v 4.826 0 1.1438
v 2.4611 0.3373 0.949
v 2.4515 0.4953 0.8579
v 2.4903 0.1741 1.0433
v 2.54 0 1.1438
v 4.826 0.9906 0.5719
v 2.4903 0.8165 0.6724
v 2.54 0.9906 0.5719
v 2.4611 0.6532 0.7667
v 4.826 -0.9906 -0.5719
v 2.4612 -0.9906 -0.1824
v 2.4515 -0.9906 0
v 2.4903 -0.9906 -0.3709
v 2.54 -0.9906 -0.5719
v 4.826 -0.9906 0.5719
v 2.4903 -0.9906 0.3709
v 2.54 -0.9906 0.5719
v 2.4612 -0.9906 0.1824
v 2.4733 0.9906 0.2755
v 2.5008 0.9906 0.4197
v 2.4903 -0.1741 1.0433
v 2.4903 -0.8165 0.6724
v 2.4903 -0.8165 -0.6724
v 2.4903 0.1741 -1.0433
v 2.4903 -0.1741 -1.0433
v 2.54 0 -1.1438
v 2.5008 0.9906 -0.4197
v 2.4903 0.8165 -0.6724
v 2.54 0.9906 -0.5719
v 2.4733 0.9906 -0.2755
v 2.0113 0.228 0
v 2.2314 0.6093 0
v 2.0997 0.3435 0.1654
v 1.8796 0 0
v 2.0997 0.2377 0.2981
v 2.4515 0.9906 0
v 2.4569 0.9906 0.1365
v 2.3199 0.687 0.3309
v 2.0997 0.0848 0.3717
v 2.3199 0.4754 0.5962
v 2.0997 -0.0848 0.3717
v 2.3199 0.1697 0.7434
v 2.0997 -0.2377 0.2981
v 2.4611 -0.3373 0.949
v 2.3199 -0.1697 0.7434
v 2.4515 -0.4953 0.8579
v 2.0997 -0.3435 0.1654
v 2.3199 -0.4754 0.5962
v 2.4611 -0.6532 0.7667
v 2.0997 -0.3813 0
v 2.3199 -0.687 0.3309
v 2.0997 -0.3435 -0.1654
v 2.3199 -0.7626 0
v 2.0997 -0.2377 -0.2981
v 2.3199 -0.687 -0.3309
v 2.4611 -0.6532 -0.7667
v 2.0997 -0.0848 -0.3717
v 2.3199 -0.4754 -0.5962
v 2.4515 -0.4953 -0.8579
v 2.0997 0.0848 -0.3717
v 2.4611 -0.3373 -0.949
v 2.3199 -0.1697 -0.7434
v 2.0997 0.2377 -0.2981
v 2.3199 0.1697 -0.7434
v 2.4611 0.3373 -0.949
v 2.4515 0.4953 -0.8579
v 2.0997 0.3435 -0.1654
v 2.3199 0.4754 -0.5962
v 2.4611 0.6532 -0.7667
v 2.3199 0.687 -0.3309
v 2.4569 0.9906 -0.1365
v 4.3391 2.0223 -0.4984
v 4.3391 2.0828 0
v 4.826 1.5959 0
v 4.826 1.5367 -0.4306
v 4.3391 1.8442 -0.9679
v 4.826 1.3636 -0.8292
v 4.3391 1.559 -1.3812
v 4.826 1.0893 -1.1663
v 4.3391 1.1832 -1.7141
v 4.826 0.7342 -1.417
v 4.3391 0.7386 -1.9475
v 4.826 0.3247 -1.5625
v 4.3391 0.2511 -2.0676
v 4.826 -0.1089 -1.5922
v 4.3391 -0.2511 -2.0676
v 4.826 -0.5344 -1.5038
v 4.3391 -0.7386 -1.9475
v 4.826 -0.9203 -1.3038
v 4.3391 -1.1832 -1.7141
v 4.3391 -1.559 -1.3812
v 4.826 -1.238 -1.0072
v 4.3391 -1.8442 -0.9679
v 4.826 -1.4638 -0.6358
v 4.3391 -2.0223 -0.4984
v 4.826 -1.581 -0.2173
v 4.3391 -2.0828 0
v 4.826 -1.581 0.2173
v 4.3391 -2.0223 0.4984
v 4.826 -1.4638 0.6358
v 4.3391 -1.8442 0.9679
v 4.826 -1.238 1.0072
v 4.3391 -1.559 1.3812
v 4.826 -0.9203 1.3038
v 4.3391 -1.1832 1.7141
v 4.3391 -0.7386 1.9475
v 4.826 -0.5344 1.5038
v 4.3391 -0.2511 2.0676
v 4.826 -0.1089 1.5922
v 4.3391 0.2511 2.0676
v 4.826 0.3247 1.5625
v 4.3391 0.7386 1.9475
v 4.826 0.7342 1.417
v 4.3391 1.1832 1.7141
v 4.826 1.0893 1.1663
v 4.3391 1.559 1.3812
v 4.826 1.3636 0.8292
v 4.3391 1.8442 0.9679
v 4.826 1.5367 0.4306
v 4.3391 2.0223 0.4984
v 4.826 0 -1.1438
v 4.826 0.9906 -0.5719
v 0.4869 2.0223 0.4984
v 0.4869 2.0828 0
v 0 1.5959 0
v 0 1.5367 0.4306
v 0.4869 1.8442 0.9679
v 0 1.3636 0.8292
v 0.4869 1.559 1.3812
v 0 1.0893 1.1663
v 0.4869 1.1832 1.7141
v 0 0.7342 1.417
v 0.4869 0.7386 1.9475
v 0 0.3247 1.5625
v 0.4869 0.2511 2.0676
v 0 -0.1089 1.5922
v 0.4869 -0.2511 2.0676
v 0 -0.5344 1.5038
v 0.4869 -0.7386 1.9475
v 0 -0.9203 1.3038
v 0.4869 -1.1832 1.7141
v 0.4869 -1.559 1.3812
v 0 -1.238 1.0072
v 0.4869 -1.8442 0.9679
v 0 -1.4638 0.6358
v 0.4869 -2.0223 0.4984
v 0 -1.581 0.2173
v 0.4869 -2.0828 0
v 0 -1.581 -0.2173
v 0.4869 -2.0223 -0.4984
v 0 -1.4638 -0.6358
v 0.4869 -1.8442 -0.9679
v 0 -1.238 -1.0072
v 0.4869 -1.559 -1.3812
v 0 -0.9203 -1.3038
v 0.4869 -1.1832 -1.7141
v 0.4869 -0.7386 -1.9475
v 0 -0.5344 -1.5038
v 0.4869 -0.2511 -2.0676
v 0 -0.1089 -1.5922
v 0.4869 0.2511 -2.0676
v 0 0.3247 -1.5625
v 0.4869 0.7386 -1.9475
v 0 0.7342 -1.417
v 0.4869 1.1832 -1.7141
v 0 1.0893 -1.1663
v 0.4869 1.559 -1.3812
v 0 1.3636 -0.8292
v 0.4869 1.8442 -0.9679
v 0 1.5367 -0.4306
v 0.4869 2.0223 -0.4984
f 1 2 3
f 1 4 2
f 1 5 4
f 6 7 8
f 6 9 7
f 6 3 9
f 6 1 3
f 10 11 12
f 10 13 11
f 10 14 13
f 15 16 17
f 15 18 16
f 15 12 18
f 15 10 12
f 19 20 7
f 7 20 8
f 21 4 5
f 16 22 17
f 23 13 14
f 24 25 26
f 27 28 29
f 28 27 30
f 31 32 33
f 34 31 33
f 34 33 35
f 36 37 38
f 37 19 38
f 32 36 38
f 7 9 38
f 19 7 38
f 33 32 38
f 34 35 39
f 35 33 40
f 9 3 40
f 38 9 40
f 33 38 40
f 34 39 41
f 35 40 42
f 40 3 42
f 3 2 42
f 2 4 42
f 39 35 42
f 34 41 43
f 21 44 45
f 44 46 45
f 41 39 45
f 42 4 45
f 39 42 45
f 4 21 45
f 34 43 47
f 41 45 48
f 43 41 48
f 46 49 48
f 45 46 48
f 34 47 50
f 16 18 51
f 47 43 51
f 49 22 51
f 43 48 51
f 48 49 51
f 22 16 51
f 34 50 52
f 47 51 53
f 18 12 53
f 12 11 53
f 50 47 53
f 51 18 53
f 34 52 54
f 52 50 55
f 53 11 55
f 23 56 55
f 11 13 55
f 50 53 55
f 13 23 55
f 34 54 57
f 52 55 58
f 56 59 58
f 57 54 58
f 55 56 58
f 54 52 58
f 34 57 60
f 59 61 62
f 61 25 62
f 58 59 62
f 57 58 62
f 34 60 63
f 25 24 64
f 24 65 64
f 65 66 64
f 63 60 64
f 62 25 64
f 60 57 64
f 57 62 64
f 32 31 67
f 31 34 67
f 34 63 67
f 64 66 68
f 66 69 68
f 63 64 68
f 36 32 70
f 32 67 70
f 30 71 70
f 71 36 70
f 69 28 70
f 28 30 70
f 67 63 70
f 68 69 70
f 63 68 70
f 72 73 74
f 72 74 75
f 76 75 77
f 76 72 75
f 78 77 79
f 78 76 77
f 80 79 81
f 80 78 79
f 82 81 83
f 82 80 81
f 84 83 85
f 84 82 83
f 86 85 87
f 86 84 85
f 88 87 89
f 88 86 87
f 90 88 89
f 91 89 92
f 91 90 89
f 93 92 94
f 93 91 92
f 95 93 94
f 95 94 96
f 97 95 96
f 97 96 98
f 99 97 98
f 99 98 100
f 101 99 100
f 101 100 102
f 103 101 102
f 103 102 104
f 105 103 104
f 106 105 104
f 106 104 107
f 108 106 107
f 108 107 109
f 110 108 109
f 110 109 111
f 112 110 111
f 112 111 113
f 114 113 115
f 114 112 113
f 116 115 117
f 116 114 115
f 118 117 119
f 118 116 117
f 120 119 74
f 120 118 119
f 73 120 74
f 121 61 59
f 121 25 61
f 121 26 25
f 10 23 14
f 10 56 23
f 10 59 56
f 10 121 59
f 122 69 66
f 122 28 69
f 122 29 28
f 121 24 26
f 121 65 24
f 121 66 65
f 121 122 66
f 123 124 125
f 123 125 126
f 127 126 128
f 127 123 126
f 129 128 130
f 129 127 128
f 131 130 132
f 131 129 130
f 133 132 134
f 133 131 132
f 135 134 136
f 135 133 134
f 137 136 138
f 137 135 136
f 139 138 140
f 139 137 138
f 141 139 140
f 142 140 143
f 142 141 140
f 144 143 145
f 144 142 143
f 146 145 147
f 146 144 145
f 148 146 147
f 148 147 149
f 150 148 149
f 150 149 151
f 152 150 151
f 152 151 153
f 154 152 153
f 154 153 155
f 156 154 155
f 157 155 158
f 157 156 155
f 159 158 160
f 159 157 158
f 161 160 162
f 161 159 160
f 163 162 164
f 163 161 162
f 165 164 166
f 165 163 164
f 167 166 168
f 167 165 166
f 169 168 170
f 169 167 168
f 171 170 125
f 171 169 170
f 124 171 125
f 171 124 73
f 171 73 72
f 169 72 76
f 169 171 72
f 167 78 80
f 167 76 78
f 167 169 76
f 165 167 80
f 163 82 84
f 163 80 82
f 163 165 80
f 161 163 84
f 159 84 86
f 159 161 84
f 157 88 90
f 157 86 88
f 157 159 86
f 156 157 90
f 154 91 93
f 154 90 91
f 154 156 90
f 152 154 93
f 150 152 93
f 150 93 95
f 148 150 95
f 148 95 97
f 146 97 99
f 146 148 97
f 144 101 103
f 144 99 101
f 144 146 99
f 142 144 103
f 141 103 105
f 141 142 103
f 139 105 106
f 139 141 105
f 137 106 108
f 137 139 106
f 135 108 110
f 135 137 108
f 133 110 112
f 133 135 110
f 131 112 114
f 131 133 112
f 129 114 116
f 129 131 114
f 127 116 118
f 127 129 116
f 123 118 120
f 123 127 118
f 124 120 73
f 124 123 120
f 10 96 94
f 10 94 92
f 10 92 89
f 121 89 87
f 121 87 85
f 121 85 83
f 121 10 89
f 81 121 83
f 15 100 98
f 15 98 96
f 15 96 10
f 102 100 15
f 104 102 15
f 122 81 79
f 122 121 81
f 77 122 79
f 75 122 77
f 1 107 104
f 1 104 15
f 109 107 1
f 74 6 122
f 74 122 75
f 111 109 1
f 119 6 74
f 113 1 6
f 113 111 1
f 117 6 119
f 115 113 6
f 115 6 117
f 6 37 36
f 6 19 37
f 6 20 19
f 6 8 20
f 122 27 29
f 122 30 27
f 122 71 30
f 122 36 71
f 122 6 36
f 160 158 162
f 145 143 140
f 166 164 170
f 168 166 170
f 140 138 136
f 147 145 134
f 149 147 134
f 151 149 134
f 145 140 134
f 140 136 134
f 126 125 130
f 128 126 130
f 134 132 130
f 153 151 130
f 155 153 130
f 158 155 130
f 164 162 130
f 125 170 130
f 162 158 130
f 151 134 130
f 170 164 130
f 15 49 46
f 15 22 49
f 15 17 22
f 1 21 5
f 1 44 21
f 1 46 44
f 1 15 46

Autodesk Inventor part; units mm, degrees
ref_plane "YZ Plane" through (0, 0, 0) normal (1, 0, 0) x (0, 1, 0)
ref_plane "XZ Plane" through (0, 0, 0) normal (0, 1, 0) x (-1, 0, 0)
sketch "Sketch1" plane through (0, 0, 0) normal (0, 0, 1) x (1, 0, 0)
  line L0 (0, 0) -> (1.8796, 0)
  line L1 (4.826, 1.1438) -> (4.826, 2.0828)
  line L2 (4.826, 2.0828) -> (0, 2.0828)
  line L3 (4.826, 1.1438) -> (2.54, 1.1438)
  line L4 (2.54, 1.1438) -> (1.8796, 0)
  line L5 (0, -0.4166) -> (0, 2.4994) projected
  line L6 (0, 2.0828) -> (0, 0)
  dimension "d0" = 2.286
  dimension "d1" = 60
  dimension "d2" = 4.1656
  dimension "d3" = 2.2877
  dimension "d5" = 4.826
revolve "Body" add sketch "Sketch1" angle 360 about axis through (0, 0, 0) along (1, 0, 0)
chamfer "Chamfer1" distance 0.4869 angle 45 1 edges at (4.826, -2.0828, 0) measured on face at (4.826, 1.7496, -0.1661)
sketch "Sketch2" plane through (4.826, 0, 0) normal (1, 0, 0) x (0, 0, -1)
  circle A0 centre (0, 0) radius 1.1438 projected
  line L0 (-0.5719, 0.9906) -> (0.5719, 0.9906)
  line L1 (0.5719, 0.9906) -> (1.1438, 0)
  line L2 (1.1438, 0) -> (0.5719, -0.9906)
  line L3 (0.5719, -0.9906) -> (-0.5719, -0.9906)
  line L4 (-0.5719, -0.9906) -> (-1.1438, 0)
  line L5 (-1.1438, 0) -> (-0.5719, 0.9906)
  point P0 (0, 0)
  point P1 (0, 0)
extrude "Slot" add sketch "Sketch2" against normal up to next contours L1 A0 | A0 L2 | L0 A0 | A0 L3 | L5 A0 | A0 L4
thread "Thread" size "8-32 UNC" class "2A" standard "ANSI Unified Screw Threads" length 4.826
chamfer "Chamfer2" distance 0.4869 angle 45 1 edges at (0, -2.0828, 0) measured on face at (1.4464, 2.076, -0.1676)
ref_plane "Work Plane1" through (2.413, 0, 0) normal (0, 0.5, 0.866) x (1, 0, 0)
equation "\"d0\" = INTI"
equation "\"d2\" = NND"
equation "\"d3\" = 1.1547 * SW"
equation "\"d5\" = NLG"
equation "\"d7\" = -0.5 * GD1 + 0.5 * NND"
equation "\"d8\" = FAWI"
equation "\"d29\" = -0.5 * GD1 + 0.5 * NND"
equation "\"d11\" = NLG"
equation "\"d13\" = -0.5 * GD1 + 0.5 * NND"
equation "\"d14\" = FAWI"
equation "\"d30\" = -0.5 * GD1 + 0.5 * NND"
equation "\"NND\" = 4.1656"
equation "\"NLG\" = 4.826"
equation "\"INTI\" = 2.286"
equation "\"FAWI\" = 45deg"
equation "\"SW\" = 1.9812"
equation "\"GD1\" = 3.19177"
equation "\"FAWI1\" = 44.999991deg"
equation "\"SPD\" = 2.2098"
equation "\"SEWI\" = 90deg"
equation "\"TOA\" = 30deg"
equation "\"ZLG\" = 1.0922"
equation "\"ZD\" = 2.7686"
equation "\"HHPTC\" = 0.79375"
equation "\"THREADDIA\" = 4.1656"
equation "\"OPR\" = 3.1242"
equation "\"E0\" = 1.155 * SW"
properties part number "ANSI B18.3 - 8-32 UNC x 0.19" material "Steel, Alloy"
